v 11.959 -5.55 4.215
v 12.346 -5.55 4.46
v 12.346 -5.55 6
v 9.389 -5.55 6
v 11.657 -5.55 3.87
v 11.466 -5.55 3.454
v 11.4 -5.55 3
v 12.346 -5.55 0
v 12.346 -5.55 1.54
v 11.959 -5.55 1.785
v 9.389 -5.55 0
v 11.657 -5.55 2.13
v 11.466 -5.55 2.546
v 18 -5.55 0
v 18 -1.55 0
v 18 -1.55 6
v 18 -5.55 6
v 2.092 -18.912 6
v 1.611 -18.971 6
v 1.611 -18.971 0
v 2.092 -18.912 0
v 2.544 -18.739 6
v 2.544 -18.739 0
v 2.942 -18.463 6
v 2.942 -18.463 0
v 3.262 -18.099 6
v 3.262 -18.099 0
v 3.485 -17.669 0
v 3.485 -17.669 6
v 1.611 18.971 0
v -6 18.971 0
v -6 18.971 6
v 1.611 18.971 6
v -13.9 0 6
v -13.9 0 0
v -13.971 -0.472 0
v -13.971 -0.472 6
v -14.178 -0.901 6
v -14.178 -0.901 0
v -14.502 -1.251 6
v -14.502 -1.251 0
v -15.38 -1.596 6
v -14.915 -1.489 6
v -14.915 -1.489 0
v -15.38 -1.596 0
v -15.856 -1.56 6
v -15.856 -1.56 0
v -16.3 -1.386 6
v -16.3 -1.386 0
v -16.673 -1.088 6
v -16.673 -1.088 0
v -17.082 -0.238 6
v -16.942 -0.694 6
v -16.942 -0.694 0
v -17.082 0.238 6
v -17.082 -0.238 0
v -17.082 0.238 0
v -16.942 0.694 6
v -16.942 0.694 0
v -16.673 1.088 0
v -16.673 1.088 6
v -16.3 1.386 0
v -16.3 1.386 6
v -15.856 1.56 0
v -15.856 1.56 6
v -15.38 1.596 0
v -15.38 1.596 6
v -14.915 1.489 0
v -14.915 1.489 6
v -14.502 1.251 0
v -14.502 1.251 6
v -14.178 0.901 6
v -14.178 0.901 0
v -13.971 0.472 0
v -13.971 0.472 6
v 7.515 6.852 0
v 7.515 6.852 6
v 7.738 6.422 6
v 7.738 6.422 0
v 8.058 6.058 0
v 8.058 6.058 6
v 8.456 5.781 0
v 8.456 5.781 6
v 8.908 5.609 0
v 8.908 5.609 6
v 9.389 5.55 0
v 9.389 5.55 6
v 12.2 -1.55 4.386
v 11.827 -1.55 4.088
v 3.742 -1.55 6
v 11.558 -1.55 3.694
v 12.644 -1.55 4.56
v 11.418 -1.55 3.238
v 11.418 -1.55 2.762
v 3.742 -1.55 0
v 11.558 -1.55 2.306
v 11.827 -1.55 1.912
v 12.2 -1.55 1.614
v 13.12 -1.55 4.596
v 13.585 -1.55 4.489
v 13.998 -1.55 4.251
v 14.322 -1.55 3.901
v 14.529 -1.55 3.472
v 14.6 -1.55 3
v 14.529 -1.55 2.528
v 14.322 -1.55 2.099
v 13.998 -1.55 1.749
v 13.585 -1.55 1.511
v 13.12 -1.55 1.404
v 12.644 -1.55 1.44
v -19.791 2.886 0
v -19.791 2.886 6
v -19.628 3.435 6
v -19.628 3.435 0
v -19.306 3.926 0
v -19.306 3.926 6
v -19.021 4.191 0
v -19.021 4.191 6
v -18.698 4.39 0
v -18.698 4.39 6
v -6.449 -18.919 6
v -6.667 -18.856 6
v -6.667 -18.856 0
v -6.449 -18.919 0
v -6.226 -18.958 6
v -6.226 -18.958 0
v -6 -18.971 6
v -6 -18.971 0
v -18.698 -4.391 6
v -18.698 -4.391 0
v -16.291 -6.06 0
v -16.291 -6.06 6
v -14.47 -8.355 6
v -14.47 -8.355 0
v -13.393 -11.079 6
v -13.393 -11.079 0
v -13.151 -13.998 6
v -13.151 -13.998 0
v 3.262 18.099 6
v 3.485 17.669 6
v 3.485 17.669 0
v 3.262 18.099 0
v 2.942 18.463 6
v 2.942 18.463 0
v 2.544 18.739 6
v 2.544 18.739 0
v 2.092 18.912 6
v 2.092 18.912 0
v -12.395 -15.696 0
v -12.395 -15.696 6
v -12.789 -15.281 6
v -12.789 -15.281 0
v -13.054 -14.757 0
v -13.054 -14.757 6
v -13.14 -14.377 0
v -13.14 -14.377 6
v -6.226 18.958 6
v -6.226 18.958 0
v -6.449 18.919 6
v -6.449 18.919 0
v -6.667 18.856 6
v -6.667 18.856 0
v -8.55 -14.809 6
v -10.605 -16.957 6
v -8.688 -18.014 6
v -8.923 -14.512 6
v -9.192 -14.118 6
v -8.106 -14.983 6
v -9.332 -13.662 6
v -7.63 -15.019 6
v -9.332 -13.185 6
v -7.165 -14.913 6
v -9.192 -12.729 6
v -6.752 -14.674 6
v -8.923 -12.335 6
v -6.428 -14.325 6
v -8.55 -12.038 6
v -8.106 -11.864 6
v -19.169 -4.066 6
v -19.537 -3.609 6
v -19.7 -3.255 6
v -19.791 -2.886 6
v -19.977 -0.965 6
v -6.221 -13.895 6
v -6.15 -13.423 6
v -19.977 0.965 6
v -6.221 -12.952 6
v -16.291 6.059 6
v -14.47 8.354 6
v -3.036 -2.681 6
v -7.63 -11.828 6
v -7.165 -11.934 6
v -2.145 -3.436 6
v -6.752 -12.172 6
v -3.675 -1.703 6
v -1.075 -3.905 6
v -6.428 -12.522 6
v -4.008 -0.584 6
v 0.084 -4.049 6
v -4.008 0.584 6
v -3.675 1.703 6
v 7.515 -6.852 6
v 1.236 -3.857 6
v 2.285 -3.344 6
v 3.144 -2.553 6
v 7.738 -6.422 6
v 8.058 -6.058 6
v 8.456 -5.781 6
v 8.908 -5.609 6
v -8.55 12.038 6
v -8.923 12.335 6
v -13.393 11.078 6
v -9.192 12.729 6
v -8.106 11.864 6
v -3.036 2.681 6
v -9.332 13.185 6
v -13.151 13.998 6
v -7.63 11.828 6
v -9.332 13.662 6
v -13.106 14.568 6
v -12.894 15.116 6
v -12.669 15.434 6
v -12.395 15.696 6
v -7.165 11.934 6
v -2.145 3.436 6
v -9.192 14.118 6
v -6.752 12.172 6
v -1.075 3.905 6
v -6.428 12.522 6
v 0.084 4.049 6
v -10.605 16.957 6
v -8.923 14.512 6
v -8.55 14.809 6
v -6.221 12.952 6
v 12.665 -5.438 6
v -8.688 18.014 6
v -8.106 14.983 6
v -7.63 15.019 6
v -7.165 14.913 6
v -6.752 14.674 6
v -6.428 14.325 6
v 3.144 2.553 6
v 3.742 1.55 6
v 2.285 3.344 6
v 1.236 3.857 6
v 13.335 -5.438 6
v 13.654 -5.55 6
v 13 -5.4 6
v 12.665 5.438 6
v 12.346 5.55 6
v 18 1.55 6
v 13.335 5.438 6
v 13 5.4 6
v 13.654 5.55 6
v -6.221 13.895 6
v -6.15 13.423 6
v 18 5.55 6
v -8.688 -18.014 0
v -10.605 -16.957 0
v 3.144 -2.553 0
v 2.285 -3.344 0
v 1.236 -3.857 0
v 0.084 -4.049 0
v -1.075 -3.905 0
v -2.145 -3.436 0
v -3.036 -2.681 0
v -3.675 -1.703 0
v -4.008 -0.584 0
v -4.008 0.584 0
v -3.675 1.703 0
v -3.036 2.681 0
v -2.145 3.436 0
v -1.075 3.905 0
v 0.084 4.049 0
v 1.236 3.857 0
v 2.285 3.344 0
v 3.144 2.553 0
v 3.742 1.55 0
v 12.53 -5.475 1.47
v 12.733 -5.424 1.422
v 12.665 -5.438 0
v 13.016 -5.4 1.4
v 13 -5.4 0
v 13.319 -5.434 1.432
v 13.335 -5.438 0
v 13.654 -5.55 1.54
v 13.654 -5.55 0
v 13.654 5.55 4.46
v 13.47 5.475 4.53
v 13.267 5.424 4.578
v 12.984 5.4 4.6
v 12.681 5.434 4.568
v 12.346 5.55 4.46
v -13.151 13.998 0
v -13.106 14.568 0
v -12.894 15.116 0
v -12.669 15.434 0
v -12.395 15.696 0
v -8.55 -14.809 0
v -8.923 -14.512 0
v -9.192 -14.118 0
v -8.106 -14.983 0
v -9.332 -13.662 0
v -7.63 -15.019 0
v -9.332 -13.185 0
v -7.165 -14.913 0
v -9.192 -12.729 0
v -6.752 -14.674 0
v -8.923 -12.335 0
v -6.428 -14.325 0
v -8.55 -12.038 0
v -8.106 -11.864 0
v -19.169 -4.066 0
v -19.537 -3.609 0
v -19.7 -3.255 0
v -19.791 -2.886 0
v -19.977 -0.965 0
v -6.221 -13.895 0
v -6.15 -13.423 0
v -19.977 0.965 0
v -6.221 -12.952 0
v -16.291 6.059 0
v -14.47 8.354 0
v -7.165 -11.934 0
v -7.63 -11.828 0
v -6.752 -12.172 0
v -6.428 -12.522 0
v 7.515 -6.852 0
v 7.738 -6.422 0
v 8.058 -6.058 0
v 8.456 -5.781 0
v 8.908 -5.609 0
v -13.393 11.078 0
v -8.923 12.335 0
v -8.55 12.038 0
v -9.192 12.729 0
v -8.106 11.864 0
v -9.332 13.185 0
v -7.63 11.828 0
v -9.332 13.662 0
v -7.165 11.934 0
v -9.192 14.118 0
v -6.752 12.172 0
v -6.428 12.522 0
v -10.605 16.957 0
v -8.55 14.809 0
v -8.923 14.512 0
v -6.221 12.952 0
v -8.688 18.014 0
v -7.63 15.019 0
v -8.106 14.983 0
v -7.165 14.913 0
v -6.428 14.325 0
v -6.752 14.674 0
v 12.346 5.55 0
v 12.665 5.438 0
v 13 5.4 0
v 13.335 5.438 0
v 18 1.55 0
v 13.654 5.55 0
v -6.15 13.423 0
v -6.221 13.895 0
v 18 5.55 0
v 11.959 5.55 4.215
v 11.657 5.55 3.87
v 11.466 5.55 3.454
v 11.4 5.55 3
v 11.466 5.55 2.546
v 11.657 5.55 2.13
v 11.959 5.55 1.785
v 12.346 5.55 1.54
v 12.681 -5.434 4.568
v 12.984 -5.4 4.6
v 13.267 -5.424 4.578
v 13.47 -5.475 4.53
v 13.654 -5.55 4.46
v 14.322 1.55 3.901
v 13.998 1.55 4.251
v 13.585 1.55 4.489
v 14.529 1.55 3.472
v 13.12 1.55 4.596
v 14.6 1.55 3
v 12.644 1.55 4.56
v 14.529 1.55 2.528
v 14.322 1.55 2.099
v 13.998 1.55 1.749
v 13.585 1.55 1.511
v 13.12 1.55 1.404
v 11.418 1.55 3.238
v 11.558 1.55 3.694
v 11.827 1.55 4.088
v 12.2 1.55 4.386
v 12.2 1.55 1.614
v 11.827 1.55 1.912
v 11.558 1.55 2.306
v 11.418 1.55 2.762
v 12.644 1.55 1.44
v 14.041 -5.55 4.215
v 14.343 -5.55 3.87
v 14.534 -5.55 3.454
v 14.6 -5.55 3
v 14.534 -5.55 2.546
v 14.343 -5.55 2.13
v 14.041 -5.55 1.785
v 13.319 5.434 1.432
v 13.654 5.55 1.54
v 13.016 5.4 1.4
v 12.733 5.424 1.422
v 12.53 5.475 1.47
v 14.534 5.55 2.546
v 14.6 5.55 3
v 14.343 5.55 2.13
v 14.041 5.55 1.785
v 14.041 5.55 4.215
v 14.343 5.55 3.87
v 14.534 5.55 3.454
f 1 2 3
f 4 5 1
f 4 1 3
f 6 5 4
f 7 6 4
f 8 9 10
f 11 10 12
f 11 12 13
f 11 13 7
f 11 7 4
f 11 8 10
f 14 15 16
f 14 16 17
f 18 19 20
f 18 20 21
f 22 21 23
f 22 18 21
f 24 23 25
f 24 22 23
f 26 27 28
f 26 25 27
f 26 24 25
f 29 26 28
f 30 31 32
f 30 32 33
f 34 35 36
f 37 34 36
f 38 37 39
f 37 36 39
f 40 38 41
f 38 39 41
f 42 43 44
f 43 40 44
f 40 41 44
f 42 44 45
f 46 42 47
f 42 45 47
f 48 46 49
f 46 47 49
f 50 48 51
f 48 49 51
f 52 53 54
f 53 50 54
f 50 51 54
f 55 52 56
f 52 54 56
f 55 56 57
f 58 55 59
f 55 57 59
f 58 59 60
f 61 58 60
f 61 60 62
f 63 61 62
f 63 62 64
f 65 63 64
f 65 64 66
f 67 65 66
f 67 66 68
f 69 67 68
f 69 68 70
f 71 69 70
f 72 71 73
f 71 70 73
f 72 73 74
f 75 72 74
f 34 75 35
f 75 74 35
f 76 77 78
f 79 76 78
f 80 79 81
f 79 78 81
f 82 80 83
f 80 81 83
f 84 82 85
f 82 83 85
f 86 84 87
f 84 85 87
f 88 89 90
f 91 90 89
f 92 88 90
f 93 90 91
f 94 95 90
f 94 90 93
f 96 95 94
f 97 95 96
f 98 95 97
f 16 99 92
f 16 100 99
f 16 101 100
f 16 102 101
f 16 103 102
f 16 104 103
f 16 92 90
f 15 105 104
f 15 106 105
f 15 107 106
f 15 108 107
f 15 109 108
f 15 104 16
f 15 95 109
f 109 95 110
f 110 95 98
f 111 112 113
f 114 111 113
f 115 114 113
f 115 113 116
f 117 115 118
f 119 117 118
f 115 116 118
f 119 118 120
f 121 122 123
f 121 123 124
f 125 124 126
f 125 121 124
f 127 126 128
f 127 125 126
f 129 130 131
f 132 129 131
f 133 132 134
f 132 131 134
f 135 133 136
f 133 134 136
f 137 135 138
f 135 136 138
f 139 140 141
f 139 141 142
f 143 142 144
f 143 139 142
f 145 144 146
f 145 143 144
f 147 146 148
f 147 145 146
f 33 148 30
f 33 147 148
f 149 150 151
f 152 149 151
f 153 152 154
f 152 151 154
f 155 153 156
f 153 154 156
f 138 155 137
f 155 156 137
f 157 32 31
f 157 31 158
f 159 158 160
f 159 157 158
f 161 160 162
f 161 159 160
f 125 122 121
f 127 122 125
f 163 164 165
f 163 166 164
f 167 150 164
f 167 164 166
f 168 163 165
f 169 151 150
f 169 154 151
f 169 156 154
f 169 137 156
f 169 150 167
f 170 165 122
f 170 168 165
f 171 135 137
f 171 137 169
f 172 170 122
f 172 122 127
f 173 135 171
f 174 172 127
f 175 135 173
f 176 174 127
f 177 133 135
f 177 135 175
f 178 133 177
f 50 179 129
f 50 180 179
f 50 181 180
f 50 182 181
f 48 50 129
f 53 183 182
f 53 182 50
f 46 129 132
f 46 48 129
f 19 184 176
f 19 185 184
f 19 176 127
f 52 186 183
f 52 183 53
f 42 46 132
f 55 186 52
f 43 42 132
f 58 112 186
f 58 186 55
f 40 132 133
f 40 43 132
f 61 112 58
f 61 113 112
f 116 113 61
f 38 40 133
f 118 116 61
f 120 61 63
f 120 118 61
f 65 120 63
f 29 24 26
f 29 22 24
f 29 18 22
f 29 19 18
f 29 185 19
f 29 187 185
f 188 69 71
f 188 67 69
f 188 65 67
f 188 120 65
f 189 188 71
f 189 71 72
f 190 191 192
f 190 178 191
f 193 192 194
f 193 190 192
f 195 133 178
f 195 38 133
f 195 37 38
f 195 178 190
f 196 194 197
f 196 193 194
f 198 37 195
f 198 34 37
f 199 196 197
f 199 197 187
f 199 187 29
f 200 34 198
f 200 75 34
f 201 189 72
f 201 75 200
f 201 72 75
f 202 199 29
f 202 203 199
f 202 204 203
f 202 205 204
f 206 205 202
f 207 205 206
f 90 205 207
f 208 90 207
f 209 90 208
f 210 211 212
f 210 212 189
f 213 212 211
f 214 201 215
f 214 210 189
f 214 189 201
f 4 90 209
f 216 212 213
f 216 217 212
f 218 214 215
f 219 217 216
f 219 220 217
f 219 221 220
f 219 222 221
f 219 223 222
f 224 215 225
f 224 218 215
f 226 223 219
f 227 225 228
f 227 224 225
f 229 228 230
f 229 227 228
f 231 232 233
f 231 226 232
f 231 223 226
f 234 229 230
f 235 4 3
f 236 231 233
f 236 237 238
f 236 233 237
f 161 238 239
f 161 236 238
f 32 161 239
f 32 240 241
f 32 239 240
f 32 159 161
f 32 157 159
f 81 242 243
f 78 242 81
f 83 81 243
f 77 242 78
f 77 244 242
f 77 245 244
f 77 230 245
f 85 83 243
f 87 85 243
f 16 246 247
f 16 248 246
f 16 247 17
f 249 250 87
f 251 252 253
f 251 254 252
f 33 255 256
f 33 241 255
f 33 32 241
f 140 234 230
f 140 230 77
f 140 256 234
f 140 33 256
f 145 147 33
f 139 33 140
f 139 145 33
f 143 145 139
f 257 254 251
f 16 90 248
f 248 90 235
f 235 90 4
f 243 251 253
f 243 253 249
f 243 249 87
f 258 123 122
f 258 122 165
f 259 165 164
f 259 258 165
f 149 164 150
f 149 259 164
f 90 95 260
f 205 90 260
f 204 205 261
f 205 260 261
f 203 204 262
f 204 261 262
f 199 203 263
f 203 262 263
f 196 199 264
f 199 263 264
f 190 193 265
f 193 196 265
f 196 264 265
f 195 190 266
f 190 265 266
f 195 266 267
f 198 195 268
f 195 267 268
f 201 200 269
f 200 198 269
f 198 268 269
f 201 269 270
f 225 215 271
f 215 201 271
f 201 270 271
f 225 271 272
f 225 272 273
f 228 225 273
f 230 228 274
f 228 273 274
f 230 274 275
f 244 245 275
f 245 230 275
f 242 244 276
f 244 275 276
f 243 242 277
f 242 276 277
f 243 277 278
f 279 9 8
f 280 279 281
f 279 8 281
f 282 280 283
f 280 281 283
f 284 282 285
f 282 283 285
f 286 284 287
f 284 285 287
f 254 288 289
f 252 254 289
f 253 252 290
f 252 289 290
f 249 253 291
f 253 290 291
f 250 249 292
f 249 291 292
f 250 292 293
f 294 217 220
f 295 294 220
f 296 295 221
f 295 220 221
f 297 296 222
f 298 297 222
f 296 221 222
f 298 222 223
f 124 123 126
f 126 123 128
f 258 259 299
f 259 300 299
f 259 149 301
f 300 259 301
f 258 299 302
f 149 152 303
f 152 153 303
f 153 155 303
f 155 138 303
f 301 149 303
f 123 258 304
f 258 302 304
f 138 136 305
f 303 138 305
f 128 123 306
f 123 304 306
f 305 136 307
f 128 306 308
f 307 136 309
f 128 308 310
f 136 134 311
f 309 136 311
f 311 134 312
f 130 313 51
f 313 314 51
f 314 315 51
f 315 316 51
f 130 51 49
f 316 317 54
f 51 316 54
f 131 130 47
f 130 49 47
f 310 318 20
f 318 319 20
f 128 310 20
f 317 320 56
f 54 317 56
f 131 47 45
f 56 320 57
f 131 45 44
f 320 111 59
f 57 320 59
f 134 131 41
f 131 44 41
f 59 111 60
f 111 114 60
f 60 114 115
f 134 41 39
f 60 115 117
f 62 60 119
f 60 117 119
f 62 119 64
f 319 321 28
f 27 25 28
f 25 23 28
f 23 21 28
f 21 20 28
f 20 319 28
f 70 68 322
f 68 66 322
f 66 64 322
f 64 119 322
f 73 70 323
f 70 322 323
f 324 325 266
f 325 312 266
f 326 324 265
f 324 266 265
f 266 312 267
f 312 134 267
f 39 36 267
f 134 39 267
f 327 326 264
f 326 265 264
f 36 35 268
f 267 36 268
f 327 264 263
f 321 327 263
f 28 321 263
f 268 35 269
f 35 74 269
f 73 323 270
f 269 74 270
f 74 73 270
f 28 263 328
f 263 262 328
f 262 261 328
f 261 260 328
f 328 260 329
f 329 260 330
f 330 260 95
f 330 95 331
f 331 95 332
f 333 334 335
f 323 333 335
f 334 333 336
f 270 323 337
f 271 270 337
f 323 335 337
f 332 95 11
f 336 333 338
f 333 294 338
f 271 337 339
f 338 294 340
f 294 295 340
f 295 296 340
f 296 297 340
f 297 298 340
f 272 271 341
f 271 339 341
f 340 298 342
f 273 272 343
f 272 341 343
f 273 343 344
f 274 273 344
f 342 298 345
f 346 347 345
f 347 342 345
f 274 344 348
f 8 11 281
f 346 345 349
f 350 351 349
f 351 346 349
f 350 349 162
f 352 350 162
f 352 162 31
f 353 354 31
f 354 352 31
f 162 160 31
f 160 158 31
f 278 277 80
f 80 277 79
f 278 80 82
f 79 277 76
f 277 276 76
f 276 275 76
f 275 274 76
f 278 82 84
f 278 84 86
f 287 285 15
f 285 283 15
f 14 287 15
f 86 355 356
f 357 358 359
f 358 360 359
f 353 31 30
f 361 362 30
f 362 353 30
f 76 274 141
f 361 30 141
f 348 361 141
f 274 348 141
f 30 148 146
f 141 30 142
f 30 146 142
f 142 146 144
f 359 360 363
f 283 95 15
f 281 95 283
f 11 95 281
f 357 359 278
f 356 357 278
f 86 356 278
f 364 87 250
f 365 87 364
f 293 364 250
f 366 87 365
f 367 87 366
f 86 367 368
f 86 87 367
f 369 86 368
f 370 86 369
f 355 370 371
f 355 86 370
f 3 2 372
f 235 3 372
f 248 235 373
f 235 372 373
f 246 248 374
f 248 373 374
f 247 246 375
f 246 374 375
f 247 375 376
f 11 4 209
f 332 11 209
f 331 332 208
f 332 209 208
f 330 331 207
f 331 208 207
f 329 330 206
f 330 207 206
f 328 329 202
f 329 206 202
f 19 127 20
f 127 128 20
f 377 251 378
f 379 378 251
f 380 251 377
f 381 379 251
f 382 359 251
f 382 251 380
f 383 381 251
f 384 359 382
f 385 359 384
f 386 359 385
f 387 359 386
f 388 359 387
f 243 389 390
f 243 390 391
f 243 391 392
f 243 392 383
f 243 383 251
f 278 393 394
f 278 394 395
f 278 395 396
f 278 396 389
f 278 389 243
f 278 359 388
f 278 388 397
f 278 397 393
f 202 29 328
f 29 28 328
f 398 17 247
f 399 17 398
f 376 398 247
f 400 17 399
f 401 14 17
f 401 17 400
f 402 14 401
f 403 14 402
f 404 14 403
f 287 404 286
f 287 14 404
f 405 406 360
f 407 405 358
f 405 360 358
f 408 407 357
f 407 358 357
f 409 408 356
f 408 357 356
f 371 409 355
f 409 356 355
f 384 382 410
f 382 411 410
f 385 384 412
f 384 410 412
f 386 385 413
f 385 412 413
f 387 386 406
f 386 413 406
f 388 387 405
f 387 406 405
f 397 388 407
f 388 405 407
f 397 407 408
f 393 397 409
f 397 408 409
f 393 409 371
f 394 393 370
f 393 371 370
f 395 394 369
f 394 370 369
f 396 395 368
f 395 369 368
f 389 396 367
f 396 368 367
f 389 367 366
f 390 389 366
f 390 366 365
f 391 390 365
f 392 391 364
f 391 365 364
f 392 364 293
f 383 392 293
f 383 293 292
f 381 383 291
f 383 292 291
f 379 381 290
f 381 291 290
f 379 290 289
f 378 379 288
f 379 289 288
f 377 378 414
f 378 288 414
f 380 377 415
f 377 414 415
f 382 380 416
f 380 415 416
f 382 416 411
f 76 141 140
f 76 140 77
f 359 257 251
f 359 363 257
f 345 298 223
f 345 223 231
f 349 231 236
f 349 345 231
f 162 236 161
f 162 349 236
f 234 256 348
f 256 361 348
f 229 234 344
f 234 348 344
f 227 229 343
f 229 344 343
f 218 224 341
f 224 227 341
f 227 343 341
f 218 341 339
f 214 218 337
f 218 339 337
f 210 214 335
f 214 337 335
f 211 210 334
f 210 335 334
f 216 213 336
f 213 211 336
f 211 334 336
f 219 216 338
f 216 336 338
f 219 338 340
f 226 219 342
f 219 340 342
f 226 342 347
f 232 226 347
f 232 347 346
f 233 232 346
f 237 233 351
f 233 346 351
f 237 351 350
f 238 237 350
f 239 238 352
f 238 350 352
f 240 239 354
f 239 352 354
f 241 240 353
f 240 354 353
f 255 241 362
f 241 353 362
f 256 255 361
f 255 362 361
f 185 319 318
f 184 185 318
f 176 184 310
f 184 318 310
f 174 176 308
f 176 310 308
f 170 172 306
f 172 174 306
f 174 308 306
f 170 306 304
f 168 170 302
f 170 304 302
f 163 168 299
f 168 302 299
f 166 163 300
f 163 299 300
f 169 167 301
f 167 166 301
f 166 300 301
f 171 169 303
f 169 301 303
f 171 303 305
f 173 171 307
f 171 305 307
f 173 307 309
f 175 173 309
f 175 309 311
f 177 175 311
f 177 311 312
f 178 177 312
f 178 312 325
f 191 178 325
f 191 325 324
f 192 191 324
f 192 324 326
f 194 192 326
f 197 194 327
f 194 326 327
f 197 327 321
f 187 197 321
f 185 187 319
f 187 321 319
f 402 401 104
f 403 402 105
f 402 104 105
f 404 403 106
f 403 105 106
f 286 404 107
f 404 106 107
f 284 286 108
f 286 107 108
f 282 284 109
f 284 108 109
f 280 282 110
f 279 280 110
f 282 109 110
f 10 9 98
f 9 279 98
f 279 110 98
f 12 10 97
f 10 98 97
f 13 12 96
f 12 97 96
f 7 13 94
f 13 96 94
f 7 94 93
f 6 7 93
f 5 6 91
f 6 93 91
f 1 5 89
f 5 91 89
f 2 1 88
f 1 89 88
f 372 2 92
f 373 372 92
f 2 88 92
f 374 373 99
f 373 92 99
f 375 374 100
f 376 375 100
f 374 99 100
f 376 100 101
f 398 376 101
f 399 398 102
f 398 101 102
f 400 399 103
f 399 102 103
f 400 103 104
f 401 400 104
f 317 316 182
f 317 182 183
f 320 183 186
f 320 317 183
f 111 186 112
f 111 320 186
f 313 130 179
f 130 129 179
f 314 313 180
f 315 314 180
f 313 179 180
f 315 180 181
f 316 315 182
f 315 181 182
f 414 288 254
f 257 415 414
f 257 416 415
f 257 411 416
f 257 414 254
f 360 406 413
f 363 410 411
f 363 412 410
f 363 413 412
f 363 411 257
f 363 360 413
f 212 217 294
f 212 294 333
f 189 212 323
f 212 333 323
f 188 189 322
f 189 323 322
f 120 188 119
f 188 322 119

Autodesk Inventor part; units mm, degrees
ref_plane "YZ Plane" through (0, 0, 0) normal (1, 0, 0) x (0, 1, 0)
ref_plane "XZ Plane" through (0, 0, 0) normal (0, 1, 0) x (-1, 0, 0)
ref_plane "XY Plane" through (0, 0, 0) normal (0, 0, 1) x (1, 0, 0)
sketch "スケッチ1" plane through (0, 0, 0) normal (0, 0, 1) x (1, 0, 0)
  arc A0 (3.7417, 1.55) -> (3.7417, -1.55) centre (0, 0) ccw
  circle A1 centre (-15.5, 0) radius 1.6
  circle A2 centre (-7.75, 13.4234) radius 1.6
  circle A3 centre (-7.75, -13.4234) radius 1.6
  line L0 (-7.75, 13.4234) -> (0, 0) construction
  line L1 (0, 0) -> (-7.75, -13.4234) construction
  line L2 (-15.5, 0) -> (0, 0) construction
  arc A4 (-6.3339, 18.9706) -> (-13.2621, 14.9706) centre (0, 0) ccw
  arc A5 (-19.5959, 4) -> (-19.5959, -4) centre (0, 0) ccw
  arc A6 (-13.2621, -14.9706) -> (-6.3339, -18.9706) centre (0, 0) ccw
  arc A7 (-19.5959, 4) -> (-13.2621, 14.9706) centre (-23.1306, 13.3545) ccw
  line L3 (-6.3339, 18.9706) -> (-7.75, 13.4234) construction
  line L4 (-13.2621, 14.9706) -> (-7.75, 13.4234) construction
  line L5 (-13.2621, 14.9706) -> (-6.3339, 18.9706) construction
  line L6 (-19.5959, 4) -> (-15.5, 0) construction
  line L7 (-15.5, 0) -> (-19.5959, -4) construction
  line L8 (-19.5959, -4) -> (-19.5959, 4) construction
  line L9 (-13.2621, -14.9706) -> (-6.3339, -18.9706) construction
  line L10 (-6.3339, -18.9706) -> (-7.75, -13.4234) construction
  line L11 (-7.75, -13.4234) -> (-13.2621, -14.9706) construction
  arc A8 (-13.2621, -14.9706) -> (-19.5959, -4) centre (-23.1306, -13.3545) ccw
  line L12 (8, 5.55) -> (12.3462, 5.55)
  line L13 (18, 5.55) -> (18, 1.55)
  line L14 (18, 1.55) -> (3.7417, 1.55)
  line L15 (3.7417, -1.55) -> (18, -1.55)
  line L16 (18, -1.55) -> (18, -5.55)
  line L17 (18, -5.55) -> (13.6538, -5.55)
  line L18 (-6.3339, 18.9706) -> (3, 18.9706)
  line L19 (3, 18.9706) -> (8, 5.55)
  line L20 (-6.3339, -18.9706) -> (3, -18.9706)
  line L21 (3, -18.9706) -> (8, -5.55)
  arc A9 (12.3462, 5.55) -> (13.6538, 5.55) centre (13, 6.9) ccw
  arc A10 (13.6538, -5.55) -> (12.3462, -5.55) centre (13, -6.9) ccw
  arc A11 (13.6538, 5.55) -> (12.3462, 5.55) centre (13, 6.9) ccw construction
  arc A12 (12.3462, -5.55) -> (13.6538, -5.55) centre (13, -6.9) ccw construction
  line L22 (13.6538, 5.55) -> (18, 5.55)
  line L23 (12.3462, 5.55) -> (13.6538, 5.55) construction
  line L24 (13.6538, -5.55) -> (12.3462, -5.55) construction
  line L25 (12.3462, -5.55) -> (8, -5.55)
  dimension "d18" = 8.1
  dimension "d24" = 3.2
  dimension "d25" = 3.2
  dimension "d26" = 60
  dimension "d27" = 60
  dimension "d28" = 15.5
  dimension "d29" = 3.2
  dimension "d30" = 20
  dimension "d31" = 20
  dimension "d36" = 3.1
  dimension "d37" = 1.55
  dimension "d38" = 4
  dimension "d39" = 4
  dimension "d40" = 10
  dimension "d44" = 18
  dimension "d45" = 18
  dimension "d47" = 3
  dimension "d48" = 1.35
  dimension "d49" = 3
  dimension "d50" = 1.35
  dimension "d51" = 5
  dimension "d59" = 10
  dimension "d60" = 10
  dimension "d61" = 8
  dimension "d62" = 8
  dimension "d63" = 8
  dimension "d64" = 5
extrude "押し出し1" add sketch "スケッチ1" along normal blind 6
sketch "スケッチ2" plane through (13.6538, 5.55, 0) normal (0, 1, 0) x (1, 0, 0)
  circle A0 centre (-0.6538, -3) radius 1.6
  line L0 (0, 0) -> (-1.3077, 0) projected
  point P0 (-13.6538, 0)
  point P1 (-0.6538, 0)
  dimension "d54" = 3.2
  dimension "d55" = 3
extrude "押し出し2" cut sketch "スケッチ2" against normal through all
fillet "フィレット1" radius 2 10 edges at (8, 5.55, 3) (3, 18.9706, 3) (-6.3339, 18.9706, 3) (-13.2621, 14.9706, 3) (-19.5959, 4, 3) (-19.5959, -4, 3) (-13.2621, -14.9706, 3) (-6.3339, -18.9706, 3) (3, -18.9706, 3) (8, -5.55, 3)
equation "\"d45\" = d44"
properties part number "オムニ固定する" material "アルミニウム 6061"
